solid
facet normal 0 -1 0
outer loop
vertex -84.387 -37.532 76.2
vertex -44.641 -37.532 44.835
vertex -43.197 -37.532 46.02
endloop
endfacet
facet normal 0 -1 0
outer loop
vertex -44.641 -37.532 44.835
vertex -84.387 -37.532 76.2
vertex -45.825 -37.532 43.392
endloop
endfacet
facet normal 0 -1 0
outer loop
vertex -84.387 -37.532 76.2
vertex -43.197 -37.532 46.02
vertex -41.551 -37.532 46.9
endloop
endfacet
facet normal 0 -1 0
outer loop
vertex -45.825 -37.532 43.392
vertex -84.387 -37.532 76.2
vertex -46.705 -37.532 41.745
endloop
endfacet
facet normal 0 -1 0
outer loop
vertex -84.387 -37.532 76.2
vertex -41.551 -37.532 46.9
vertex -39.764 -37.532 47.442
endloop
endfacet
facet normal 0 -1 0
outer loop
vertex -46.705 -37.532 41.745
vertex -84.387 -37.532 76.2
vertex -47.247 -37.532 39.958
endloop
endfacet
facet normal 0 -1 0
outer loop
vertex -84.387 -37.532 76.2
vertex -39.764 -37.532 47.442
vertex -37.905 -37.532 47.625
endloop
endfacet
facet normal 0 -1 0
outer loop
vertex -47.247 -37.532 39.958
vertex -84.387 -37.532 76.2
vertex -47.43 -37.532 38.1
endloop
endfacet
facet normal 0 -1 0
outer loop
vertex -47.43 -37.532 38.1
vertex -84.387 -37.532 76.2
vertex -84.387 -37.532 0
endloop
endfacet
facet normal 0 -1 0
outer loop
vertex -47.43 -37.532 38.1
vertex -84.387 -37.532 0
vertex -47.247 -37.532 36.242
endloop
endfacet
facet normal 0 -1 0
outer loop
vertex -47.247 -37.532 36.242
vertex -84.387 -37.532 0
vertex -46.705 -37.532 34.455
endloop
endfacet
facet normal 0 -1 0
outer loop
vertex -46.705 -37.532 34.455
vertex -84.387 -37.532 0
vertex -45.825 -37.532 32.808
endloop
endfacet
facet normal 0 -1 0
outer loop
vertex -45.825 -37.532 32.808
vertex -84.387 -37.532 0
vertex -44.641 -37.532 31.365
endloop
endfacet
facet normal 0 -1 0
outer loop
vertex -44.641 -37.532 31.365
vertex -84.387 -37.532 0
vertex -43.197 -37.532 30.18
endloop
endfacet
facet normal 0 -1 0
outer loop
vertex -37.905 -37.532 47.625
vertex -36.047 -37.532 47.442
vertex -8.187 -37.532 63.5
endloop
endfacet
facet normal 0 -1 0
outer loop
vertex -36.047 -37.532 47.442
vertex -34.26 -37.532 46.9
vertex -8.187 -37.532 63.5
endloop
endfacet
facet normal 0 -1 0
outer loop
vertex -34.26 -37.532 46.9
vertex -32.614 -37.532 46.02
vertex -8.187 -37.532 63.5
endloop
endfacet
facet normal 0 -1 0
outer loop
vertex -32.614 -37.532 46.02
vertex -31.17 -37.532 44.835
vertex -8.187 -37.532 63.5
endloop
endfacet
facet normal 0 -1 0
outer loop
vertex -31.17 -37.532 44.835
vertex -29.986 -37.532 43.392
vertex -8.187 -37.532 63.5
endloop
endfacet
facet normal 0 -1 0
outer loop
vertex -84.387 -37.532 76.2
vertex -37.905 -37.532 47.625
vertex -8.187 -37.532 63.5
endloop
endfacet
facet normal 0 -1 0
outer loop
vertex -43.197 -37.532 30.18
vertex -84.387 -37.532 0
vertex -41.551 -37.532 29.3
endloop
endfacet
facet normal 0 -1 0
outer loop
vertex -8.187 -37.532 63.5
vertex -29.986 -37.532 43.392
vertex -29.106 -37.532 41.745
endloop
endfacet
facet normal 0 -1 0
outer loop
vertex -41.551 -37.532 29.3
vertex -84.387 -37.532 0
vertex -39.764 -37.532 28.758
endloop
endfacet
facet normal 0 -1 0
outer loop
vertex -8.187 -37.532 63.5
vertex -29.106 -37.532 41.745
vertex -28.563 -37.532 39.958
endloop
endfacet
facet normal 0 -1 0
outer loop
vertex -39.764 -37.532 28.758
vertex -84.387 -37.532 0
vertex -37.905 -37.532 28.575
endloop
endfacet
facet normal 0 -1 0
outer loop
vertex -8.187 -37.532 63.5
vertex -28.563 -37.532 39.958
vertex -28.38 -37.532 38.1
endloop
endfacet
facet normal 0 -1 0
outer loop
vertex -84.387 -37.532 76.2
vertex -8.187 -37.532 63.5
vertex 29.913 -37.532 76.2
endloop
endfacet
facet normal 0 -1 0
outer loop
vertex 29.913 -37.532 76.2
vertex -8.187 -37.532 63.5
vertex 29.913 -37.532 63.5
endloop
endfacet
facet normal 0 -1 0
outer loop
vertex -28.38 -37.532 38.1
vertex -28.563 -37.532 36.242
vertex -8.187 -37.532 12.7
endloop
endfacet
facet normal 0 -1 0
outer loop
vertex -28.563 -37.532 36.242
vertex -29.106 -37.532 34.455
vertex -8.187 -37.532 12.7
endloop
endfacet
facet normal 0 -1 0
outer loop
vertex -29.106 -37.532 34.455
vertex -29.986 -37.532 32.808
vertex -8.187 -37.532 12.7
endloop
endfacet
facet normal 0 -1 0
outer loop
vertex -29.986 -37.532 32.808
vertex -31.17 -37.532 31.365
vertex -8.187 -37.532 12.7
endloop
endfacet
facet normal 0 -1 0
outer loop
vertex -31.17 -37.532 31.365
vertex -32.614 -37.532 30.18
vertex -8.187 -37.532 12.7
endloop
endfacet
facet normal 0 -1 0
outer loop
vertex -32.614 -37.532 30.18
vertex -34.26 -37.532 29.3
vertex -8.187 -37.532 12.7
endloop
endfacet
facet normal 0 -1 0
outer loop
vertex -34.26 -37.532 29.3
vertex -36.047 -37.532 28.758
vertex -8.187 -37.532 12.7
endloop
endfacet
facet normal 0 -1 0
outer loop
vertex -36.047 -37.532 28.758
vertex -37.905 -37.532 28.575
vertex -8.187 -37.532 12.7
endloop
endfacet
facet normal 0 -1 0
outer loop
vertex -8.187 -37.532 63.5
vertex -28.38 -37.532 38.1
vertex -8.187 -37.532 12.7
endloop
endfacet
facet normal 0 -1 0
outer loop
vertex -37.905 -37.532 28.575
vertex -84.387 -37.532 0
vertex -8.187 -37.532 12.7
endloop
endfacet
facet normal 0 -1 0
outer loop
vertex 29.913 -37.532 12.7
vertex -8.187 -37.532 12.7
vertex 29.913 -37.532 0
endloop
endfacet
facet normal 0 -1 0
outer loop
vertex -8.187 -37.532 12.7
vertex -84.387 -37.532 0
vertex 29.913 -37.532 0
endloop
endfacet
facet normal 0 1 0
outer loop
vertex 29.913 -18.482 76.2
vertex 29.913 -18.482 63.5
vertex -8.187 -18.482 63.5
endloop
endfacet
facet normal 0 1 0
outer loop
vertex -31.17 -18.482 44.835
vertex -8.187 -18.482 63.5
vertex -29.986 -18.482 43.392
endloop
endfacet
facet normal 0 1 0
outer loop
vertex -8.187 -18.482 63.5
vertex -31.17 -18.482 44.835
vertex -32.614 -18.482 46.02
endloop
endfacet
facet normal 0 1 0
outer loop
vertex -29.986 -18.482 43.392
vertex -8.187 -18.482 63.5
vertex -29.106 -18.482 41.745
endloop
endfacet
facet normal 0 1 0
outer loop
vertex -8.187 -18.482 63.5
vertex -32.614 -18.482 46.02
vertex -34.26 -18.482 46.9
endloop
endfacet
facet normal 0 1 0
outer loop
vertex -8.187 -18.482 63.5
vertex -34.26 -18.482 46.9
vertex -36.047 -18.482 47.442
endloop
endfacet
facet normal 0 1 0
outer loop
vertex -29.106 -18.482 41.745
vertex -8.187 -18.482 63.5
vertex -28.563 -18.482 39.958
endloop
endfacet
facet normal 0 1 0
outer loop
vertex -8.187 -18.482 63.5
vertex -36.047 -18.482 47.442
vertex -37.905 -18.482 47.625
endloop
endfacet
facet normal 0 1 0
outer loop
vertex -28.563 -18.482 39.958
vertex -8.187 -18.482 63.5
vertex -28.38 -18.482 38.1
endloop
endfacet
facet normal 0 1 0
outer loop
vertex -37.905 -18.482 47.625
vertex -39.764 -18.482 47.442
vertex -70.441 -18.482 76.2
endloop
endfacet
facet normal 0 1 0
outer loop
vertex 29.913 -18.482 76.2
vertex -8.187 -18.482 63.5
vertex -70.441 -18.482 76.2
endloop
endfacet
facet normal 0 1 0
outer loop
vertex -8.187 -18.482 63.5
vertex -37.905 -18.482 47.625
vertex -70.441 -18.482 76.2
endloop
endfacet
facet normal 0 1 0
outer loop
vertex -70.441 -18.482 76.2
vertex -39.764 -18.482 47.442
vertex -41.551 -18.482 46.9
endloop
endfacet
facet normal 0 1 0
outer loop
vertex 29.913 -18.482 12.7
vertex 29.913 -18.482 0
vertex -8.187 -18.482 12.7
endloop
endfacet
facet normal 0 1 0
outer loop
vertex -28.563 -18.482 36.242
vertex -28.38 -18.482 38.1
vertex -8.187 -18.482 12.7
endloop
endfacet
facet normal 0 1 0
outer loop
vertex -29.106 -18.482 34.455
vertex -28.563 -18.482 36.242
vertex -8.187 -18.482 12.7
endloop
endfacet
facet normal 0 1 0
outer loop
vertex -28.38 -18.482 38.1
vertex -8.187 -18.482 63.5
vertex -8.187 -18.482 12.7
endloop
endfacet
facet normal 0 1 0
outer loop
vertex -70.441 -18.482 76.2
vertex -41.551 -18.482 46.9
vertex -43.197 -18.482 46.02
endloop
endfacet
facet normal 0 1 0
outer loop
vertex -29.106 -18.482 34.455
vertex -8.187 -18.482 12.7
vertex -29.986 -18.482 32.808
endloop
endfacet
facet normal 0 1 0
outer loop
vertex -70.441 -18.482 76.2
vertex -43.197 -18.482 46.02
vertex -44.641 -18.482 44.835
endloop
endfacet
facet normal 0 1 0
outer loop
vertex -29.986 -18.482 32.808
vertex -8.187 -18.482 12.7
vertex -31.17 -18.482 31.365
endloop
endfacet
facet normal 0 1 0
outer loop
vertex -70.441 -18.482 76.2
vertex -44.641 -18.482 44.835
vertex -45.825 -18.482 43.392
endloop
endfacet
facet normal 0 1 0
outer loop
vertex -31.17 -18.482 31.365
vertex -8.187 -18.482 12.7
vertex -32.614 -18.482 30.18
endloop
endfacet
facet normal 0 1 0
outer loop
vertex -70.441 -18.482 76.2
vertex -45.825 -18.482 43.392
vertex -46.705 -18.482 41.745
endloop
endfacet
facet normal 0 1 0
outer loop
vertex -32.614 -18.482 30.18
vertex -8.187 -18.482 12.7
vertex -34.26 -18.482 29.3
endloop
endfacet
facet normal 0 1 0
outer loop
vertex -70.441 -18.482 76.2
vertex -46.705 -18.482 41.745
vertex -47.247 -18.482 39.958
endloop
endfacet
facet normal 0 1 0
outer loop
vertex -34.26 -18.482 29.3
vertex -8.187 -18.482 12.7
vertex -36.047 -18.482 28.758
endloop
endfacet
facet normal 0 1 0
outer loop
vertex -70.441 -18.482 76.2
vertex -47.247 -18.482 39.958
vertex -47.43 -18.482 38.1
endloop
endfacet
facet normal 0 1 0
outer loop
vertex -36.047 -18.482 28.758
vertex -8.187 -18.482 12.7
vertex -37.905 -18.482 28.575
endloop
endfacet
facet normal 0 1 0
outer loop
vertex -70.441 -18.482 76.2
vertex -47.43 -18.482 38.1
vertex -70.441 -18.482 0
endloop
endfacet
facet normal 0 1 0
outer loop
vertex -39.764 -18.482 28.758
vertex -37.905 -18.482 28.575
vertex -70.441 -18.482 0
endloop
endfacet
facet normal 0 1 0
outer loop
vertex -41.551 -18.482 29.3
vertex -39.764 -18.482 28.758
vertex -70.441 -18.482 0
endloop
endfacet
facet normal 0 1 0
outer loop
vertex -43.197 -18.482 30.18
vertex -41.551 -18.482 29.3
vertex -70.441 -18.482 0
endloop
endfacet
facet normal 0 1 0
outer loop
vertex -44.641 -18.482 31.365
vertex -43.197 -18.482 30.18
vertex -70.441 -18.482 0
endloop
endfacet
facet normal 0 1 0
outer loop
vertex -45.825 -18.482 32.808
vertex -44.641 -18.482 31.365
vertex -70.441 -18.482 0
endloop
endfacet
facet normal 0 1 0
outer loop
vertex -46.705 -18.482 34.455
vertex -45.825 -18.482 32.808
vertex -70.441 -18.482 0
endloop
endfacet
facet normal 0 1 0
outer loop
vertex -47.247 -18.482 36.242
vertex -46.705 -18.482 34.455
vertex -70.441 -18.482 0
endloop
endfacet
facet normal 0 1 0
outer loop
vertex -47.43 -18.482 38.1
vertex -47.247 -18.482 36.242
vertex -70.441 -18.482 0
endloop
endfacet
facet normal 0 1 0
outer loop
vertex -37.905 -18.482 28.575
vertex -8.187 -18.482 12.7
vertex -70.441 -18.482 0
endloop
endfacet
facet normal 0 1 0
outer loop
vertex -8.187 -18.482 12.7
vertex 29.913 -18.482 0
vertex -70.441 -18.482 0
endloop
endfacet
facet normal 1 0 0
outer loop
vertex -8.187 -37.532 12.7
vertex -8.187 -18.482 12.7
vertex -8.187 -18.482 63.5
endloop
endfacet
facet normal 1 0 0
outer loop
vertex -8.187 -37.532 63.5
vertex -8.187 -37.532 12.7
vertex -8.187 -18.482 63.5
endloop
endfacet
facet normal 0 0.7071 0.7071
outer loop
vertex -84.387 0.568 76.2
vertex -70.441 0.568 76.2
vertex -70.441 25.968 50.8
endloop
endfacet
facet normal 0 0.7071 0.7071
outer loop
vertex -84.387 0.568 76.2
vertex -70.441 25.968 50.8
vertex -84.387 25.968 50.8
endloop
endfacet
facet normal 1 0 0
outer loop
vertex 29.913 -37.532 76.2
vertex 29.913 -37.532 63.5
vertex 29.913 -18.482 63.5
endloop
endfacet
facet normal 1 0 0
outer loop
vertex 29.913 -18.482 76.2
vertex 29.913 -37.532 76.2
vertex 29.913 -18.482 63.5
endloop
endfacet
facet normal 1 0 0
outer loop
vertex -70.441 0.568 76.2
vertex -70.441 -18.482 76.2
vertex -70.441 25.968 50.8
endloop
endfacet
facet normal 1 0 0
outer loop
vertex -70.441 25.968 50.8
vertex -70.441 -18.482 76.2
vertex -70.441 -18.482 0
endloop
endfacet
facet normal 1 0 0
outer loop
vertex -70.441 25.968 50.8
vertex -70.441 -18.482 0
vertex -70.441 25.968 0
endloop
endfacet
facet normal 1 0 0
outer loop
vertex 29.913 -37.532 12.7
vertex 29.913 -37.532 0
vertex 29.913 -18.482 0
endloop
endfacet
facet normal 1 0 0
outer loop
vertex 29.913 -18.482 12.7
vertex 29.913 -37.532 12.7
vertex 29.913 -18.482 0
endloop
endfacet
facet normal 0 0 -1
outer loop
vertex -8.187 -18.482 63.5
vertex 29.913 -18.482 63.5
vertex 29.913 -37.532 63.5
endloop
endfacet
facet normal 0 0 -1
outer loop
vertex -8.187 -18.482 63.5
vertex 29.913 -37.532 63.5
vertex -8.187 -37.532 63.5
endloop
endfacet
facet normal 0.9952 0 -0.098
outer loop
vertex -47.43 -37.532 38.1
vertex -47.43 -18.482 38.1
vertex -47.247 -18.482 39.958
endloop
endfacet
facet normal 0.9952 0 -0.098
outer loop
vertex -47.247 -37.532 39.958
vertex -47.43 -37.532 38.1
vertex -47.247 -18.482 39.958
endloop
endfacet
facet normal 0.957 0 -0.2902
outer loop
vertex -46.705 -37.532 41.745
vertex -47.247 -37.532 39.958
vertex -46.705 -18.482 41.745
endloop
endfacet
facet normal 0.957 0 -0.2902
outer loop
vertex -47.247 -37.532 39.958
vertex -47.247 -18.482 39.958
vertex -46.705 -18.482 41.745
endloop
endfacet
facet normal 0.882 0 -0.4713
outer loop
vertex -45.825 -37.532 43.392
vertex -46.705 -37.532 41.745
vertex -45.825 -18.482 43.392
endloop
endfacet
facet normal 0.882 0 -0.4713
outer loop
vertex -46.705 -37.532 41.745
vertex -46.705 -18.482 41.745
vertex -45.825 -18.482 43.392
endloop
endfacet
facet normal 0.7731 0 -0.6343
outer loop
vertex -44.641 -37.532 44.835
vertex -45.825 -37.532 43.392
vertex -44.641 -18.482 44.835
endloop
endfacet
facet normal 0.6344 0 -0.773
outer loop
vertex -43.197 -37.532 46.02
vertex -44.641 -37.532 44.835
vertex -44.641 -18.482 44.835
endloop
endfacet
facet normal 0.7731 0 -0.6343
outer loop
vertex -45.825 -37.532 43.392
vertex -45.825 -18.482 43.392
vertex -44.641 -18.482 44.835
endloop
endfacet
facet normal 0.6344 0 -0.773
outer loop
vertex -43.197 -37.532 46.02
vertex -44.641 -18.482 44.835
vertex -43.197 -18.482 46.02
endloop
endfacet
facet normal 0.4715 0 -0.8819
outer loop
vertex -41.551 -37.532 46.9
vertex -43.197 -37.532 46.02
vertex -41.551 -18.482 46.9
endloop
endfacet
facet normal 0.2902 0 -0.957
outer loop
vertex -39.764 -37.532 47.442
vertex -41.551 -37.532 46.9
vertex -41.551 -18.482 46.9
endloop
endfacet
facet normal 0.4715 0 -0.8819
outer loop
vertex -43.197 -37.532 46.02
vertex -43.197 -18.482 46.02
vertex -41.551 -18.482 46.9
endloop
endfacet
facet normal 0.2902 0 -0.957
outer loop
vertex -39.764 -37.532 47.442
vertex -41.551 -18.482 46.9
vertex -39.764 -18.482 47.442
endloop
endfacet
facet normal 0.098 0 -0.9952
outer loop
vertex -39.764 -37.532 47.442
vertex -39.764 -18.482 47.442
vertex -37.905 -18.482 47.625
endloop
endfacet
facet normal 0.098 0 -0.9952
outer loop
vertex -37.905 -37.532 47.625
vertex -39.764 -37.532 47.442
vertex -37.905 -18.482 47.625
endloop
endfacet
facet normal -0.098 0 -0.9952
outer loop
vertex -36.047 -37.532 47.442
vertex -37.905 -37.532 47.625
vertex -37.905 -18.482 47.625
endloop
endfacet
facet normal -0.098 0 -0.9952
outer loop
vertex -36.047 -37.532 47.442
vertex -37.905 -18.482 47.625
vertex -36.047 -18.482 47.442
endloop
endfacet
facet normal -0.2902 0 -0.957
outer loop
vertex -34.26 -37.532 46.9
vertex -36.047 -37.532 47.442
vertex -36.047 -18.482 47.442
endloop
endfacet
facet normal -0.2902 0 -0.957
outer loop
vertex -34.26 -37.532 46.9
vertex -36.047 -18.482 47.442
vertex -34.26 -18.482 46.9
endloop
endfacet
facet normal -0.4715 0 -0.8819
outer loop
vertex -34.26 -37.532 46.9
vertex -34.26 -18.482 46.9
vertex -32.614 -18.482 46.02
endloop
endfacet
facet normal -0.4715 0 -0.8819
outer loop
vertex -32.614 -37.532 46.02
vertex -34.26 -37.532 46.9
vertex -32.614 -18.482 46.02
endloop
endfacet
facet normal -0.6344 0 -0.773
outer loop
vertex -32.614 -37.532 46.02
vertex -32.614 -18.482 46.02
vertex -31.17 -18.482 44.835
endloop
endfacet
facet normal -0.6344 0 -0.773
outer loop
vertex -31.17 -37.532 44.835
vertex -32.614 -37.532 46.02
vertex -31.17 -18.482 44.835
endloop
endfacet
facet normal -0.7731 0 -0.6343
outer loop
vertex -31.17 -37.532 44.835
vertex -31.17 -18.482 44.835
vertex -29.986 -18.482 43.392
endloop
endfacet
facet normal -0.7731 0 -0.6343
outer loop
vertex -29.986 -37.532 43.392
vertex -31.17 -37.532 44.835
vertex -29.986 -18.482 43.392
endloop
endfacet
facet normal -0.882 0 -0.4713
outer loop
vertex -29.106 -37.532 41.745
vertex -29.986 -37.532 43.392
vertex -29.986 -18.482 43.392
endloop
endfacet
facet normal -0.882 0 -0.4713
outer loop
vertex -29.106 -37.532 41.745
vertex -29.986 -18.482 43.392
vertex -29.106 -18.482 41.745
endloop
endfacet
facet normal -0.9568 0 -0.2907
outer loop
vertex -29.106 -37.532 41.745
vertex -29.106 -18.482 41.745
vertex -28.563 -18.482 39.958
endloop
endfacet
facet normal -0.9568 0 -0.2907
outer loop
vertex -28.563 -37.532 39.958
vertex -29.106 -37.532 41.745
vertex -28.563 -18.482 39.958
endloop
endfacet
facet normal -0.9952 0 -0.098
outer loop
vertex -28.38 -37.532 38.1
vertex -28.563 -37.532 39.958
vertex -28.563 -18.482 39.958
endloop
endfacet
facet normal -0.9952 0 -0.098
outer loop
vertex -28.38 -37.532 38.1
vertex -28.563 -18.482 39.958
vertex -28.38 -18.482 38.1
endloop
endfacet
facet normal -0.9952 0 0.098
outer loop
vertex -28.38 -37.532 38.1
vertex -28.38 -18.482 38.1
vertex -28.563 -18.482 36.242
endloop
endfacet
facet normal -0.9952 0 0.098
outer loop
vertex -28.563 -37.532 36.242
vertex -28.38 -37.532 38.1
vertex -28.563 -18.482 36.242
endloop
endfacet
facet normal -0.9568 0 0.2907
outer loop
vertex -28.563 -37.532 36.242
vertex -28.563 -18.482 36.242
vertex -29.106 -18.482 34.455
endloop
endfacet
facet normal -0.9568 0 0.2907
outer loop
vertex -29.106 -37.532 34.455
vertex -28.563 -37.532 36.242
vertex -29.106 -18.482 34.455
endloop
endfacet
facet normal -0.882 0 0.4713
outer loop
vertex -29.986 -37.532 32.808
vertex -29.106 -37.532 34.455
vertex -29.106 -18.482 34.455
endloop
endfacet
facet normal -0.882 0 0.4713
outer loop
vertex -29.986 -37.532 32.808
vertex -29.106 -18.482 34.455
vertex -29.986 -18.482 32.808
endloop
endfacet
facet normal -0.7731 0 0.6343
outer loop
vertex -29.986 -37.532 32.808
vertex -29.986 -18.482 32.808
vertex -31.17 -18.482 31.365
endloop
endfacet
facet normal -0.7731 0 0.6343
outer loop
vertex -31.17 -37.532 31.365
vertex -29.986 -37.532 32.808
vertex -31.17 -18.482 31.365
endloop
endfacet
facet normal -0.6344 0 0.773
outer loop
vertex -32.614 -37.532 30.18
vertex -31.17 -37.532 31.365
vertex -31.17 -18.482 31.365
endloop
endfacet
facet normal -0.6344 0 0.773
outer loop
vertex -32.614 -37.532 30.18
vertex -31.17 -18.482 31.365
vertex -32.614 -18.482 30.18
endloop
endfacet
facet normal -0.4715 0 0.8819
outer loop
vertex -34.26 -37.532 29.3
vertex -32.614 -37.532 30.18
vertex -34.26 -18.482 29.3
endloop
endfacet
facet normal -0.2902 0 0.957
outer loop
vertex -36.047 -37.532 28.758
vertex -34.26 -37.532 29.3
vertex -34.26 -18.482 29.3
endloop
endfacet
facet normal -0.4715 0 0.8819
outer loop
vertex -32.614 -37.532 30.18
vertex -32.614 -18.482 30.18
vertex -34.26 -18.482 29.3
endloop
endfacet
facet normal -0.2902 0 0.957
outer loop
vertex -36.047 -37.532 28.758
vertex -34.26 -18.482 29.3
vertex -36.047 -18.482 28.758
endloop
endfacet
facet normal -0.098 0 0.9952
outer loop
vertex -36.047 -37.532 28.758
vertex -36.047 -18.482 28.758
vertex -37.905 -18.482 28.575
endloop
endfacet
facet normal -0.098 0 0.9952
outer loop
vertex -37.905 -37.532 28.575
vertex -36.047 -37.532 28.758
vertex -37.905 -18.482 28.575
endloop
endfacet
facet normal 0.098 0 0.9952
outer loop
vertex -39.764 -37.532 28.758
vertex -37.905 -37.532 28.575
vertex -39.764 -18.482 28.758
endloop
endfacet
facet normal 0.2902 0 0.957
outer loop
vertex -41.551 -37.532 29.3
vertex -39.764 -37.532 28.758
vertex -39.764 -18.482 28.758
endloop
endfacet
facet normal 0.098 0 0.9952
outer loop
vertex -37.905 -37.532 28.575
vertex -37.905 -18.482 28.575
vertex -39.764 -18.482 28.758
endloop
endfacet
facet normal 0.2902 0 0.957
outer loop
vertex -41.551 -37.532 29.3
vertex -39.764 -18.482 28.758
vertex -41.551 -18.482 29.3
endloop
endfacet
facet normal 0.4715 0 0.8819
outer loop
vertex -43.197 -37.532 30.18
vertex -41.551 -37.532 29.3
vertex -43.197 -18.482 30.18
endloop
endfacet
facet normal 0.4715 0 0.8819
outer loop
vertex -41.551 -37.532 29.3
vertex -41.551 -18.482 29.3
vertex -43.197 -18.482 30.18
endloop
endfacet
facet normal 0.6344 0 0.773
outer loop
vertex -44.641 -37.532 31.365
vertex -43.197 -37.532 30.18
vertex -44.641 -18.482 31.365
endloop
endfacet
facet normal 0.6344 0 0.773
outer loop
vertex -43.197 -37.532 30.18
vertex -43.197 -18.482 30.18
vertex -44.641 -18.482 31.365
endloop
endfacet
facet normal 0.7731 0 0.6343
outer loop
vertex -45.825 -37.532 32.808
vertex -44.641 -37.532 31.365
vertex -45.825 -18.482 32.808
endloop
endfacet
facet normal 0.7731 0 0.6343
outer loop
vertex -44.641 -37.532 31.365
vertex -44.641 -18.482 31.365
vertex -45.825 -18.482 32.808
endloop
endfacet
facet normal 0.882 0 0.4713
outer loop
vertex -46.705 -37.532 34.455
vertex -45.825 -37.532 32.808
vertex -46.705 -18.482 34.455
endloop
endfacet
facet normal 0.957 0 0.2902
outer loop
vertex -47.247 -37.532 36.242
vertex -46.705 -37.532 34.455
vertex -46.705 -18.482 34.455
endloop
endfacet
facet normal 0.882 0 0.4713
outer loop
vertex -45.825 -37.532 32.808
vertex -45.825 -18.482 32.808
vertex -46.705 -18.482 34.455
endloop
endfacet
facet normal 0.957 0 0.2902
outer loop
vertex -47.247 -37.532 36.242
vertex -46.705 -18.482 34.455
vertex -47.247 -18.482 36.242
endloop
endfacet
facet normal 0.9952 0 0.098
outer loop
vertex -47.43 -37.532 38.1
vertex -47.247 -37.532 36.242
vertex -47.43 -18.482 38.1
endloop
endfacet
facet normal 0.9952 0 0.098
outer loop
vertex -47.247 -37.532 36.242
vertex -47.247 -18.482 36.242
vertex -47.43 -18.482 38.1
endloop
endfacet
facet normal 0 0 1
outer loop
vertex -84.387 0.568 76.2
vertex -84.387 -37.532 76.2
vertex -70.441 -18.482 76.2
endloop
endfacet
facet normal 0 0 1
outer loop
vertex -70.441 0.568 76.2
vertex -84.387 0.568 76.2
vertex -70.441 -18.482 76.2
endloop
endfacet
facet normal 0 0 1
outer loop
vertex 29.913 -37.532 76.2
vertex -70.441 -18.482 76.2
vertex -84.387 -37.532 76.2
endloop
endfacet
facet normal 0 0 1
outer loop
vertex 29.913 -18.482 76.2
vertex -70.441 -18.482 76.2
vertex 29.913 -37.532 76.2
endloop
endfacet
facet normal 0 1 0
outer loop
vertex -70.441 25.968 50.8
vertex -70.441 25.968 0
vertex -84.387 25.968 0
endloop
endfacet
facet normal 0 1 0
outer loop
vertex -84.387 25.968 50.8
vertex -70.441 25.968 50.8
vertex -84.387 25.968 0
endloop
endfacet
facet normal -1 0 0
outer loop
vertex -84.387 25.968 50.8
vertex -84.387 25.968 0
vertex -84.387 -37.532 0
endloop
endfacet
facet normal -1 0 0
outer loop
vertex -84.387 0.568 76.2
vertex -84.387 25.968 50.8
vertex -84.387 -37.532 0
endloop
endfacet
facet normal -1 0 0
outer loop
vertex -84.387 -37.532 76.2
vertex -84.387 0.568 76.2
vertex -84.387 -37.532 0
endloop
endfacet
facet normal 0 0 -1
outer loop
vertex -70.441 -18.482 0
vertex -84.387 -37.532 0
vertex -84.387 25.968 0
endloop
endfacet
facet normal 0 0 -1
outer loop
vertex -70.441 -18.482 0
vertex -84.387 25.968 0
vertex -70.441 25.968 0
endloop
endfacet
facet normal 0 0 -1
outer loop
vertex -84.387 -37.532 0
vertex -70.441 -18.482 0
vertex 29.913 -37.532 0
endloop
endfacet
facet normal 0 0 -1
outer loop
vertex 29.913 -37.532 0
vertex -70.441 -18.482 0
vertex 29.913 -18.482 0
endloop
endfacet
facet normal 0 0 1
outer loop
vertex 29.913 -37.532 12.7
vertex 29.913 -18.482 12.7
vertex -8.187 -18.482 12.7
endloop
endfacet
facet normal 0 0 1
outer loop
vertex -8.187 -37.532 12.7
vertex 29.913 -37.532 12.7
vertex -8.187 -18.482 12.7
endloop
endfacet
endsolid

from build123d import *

# Parameters (mm, degrees)
F1_DEPTH = 76.2
F2_SIZE  = 25.4
F3_R     = 9.525
F4_DEPTH = 19.051
F5_W     = 38.1
F5_H     = 50.8
F6_DEPTH = 19.051


with BuildPart() as f1:
    # F0 (on Top) → F1 (new body)
    with BuildSketch(Plane.XY):
        Polygon((-70.440705, 25.967644), (-84.387472, 25.967644), (-84.387472, -37.532356), (29.912528, -37.532356), (29.912528, -18.482356), (-70.440705, -18.482356), align=None)
    extrude(amount=F1_DEPTH)

    # F2
    f2_edges = [f1.edges().sort_by_distance(p)[0] for p in [
        (-77.414089, 25.967644, 76.2),
    ]]
    chamfer(f2_edges, length=F2_SIZE)

    # F3 (on face) → F4 (cut, through all)
    with BuildSketch(Plane(origin=(0, -18.482356, 0), x_dir=(-1, 0, 0), z_dir=(0, 1, 0))):
        with Locations((37.905472, 38.1)):
            Circle(F3_R)
    extrude(amount=-F4_DEPTH, mode=Mode.SUBTRACT)

    # F5 (on face) → F6 (cut, through all)
    with BuildSketch(Plane(origin=(0, -18.482356, 0), x_dir=(-1, 0, 0), z_dir=(0, 1, 0))):
        with Locations((-10.862528, 38.1)):
            Rectangle(F5_W, F5_H)
    extrude(amount=-F6_DEPTH, mode=Mode.SUBTRACT)


solid = f1.part
